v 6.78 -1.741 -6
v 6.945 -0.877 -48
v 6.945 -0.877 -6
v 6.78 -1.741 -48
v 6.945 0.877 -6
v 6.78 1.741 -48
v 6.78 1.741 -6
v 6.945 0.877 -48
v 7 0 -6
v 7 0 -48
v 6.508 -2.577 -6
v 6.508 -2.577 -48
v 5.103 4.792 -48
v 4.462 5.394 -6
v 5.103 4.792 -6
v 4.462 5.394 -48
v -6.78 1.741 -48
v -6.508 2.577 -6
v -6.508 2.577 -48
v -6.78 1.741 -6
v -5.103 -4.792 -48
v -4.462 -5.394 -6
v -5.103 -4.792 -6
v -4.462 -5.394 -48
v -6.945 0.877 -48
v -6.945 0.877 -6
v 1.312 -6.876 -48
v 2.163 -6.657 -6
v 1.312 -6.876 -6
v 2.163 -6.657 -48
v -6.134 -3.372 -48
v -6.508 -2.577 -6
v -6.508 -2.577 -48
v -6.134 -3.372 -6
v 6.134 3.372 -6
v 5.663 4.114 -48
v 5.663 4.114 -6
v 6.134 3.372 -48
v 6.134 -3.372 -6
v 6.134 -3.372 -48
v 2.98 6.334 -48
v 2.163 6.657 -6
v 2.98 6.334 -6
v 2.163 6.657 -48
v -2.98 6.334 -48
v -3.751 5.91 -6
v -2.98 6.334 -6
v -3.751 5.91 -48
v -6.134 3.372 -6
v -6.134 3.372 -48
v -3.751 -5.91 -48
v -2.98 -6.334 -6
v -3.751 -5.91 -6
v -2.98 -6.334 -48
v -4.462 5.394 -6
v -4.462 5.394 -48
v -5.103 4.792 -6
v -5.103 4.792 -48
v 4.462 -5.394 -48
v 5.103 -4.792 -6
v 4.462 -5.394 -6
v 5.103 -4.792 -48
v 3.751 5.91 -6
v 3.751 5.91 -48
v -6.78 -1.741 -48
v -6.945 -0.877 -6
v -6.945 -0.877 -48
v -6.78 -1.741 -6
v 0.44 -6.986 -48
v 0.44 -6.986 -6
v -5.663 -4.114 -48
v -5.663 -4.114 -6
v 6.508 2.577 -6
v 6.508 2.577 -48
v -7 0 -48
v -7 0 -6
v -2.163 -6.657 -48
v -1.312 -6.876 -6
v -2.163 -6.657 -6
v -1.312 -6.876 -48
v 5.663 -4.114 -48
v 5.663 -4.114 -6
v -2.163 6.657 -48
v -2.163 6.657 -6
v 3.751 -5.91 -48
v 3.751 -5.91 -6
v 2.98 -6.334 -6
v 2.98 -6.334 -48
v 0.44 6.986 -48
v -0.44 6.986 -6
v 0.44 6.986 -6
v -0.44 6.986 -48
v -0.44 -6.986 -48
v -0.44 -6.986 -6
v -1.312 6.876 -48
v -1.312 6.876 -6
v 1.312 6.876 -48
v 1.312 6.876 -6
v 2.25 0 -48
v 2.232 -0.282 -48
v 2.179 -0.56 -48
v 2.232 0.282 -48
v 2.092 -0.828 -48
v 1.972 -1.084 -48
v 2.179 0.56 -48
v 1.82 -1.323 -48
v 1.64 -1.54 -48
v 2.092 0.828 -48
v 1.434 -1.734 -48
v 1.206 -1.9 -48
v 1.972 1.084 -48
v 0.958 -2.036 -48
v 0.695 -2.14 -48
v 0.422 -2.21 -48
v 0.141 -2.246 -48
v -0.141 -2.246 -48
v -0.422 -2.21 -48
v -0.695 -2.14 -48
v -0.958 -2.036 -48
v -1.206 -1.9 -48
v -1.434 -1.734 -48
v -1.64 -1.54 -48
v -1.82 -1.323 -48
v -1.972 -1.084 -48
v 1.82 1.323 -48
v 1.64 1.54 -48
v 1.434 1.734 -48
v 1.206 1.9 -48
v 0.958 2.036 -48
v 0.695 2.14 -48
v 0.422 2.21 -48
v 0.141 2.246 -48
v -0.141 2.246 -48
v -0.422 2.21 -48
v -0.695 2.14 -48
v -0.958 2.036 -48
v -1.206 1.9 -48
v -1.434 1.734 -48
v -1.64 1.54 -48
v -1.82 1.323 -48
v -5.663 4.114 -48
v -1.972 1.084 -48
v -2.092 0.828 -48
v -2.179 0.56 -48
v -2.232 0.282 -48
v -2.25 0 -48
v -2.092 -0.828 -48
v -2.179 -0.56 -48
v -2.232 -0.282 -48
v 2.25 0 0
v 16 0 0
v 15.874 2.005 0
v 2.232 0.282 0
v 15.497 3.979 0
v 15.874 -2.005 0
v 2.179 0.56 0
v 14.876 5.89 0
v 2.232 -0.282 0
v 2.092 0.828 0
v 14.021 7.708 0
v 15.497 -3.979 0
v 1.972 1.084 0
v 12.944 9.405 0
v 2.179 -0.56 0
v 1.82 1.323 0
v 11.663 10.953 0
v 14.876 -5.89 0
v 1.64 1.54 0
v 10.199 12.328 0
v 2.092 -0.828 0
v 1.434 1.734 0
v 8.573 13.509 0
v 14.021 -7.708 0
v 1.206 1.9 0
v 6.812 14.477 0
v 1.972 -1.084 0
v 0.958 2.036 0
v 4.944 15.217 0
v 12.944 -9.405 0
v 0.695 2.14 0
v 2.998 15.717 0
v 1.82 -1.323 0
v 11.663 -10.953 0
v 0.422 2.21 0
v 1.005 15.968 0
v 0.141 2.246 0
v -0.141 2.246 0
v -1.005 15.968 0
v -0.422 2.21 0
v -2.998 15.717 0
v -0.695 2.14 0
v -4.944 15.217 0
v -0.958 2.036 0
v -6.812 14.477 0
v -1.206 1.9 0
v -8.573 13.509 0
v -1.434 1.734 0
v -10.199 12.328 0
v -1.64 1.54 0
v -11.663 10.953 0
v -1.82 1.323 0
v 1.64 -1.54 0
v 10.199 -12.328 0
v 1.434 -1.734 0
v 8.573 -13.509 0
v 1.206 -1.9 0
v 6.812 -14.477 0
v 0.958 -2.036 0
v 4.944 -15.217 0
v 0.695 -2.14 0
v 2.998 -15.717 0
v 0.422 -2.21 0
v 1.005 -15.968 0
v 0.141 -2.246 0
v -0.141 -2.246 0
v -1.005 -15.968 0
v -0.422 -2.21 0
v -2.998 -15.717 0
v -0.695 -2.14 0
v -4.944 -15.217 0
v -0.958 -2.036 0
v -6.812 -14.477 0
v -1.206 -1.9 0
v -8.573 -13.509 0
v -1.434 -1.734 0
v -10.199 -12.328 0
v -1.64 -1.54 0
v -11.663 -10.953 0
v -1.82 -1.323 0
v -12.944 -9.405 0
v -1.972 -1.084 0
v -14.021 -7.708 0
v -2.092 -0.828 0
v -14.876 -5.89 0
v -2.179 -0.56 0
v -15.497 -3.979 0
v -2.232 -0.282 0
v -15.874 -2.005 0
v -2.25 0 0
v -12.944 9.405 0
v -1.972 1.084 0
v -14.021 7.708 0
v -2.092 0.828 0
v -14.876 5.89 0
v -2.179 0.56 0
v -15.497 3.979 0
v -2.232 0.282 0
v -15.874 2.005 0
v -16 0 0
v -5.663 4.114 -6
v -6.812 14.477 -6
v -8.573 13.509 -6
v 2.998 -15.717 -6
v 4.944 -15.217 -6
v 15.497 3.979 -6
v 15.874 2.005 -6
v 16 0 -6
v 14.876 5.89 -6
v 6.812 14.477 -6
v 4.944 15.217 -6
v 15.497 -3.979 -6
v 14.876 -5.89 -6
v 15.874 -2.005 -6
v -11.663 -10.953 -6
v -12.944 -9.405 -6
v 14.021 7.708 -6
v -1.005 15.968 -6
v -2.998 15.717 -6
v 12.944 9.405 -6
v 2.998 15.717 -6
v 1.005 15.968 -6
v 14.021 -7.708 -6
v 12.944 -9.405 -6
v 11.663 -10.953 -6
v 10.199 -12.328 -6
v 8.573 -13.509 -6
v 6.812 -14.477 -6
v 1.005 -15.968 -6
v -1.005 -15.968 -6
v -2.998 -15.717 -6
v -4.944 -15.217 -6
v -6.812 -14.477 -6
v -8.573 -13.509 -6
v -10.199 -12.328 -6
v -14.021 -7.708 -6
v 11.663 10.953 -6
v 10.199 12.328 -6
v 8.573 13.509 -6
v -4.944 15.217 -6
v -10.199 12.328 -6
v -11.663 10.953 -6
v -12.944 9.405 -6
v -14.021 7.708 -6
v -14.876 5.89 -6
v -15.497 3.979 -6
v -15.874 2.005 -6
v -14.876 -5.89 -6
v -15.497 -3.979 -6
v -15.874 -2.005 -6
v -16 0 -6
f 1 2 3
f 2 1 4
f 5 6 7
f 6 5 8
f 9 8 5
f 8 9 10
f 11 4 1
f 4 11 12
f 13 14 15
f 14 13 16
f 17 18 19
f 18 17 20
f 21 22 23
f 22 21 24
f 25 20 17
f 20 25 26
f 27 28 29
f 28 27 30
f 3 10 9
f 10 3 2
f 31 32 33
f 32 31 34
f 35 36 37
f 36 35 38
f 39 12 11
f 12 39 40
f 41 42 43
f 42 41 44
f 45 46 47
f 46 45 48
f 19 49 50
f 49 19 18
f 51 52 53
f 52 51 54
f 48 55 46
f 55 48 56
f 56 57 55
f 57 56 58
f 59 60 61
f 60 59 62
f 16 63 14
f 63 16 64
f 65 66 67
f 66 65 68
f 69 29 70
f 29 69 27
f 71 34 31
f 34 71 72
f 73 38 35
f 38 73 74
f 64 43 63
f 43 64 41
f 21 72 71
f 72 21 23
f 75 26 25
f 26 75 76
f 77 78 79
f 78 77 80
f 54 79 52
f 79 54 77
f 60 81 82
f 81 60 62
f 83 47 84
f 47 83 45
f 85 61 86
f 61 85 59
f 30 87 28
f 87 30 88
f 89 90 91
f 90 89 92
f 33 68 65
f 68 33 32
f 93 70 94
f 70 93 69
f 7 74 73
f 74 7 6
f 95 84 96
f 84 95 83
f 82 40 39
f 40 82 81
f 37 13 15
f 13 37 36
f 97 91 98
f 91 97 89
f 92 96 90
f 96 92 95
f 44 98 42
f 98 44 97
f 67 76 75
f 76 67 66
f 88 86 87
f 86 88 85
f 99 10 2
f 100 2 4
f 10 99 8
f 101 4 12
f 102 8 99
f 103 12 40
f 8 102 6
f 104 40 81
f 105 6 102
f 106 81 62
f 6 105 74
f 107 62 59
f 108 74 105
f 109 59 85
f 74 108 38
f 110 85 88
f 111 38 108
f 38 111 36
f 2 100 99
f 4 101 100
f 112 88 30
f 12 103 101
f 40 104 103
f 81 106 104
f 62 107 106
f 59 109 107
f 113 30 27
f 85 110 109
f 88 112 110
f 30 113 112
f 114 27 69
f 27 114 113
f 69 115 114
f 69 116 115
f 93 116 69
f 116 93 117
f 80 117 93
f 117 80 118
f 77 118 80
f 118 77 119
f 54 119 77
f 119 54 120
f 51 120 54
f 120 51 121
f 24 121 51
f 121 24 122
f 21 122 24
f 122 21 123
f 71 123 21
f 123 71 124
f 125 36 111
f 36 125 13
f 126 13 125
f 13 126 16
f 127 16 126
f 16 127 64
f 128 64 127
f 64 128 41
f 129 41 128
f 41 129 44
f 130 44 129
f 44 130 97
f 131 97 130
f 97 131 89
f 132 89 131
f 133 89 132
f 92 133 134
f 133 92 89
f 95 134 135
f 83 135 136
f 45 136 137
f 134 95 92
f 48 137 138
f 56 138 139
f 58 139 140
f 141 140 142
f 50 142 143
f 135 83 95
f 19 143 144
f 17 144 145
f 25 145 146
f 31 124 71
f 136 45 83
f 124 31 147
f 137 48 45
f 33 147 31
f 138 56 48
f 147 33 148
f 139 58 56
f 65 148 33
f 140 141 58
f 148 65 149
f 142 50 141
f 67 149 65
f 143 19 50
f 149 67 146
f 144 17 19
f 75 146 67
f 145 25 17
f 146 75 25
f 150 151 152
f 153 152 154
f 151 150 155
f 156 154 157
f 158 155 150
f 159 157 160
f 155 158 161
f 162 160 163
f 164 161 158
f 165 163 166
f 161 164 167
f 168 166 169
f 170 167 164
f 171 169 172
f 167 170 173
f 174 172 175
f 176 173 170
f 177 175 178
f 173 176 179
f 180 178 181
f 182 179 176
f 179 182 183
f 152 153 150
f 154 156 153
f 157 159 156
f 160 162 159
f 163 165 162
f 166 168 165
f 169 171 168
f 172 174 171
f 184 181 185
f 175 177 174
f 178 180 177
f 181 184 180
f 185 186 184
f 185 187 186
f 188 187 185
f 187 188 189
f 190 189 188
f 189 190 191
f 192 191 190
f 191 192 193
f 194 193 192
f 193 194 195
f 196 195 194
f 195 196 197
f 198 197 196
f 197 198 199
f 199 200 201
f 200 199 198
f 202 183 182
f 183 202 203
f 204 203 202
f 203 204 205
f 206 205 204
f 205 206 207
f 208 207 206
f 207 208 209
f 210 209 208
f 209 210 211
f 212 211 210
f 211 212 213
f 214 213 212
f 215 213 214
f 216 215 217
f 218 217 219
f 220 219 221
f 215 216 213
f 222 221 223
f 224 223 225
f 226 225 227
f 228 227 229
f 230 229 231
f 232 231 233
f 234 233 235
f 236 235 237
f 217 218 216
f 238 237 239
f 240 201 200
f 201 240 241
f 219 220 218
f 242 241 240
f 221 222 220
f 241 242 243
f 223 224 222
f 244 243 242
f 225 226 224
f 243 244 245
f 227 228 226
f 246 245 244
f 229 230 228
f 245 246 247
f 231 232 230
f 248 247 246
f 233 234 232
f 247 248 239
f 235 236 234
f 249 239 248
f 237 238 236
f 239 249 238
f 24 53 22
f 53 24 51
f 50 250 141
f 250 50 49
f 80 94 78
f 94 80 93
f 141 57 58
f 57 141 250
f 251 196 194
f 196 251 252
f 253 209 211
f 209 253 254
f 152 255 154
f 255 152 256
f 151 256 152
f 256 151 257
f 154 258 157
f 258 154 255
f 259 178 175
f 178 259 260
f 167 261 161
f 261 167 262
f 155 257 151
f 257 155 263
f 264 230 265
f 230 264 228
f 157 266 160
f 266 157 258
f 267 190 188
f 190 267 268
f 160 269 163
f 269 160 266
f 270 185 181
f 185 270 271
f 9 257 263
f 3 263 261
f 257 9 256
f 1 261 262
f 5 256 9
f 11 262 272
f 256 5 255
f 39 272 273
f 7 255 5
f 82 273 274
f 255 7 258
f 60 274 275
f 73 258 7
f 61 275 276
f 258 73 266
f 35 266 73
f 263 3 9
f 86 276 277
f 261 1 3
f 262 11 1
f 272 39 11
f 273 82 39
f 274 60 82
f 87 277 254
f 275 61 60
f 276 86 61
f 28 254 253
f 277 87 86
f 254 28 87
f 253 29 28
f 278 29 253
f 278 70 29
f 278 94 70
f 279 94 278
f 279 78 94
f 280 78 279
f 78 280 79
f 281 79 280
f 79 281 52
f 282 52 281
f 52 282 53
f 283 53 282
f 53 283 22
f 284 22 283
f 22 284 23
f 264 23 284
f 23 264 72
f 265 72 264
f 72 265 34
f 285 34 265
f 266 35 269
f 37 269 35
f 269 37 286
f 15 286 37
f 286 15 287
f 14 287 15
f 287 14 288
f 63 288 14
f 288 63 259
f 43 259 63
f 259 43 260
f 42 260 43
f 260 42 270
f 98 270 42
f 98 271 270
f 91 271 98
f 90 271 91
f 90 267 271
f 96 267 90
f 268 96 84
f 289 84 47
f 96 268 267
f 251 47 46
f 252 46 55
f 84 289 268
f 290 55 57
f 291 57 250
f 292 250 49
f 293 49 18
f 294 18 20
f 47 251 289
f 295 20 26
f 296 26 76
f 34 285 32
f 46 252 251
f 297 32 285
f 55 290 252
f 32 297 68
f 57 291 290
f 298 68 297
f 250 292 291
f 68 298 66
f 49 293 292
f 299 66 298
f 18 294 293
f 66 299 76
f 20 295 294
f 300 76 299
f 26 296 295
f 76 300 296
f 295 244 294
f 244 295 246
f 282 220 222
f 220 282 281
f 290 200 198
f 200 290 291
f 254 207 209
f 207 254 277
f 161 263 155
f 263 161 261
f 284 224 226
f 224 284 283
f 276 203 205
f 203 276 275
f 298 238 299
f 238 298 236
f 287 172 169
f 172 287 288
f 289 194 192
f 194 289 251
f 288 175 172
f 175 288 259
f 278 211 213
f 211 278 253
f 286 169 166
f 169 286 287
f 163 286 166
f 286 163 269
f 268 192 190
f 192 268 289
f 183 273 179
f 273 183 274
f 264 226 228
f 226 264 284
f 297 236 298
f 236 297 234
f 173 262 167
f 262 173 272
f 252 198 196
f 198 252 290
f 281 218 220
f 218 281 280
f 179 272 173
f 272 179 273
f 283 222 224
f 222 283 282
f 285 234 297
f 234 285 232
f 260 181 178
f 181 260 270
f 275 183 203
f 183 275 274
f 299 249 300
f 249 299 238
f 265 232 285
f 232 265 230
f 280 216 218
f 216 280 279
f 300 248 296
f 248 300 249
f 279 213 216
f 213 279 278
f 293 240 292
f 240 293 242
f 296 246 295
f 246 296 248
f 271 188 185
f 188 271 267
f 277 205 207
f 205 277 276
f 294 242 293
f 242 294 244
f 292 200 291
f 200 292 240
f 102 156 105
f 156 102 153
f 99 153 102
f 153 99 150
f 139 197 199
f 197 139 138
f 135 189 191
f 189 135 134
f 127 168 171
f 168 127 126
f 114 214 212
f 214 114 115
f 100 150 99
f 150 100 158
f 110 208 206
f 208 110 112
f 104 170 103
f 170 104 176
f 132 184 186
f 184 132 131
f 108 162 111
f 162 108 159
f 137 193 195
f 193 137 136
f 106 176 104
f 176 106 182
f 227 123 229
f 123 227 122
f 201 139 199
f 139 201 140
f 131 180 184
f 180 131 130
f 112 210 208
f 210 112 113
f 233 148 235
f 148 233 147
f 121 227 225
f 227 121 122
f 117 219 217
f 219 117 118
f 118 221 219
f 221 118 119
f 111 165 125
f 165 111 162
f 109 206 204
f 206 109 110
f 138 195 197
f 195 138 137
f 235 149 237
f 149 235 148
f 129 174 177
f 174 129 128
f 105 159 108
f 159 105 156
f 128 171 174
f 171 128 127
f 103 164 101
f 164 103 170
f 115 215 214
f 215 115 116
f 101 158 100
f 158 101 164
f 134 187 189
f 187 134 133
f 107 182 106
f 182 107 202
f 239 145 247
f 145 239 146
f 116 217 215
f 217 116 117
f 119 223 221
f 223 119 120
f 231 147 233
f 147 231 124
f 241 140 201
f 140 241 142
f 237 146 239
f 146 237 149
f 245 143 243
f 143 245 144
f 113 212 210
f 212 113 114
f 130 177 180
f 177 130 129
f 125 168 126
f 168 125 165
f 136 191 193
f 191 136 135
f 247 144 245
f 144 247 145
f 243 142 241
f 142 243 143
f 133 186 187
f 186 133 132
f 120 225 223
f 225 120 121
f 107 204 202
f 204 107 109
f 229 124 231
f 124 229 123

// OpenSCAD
$fn = 50;


difference() {
	union() {
		translate(v = [0, 0, -48.0000000000]) {
			cylinder(h = 48, r = 7.0000000000);
		}
		translate(v = [0, 0, -6.0000000000]) {
			cylinder(h = 6, r = 16.0000000000);
		}
	}
	union() {
		#translate(v = [0, 0, -48]) {
			cylinder(h = 48, r = 2.2500000000);
		}
	}
}
